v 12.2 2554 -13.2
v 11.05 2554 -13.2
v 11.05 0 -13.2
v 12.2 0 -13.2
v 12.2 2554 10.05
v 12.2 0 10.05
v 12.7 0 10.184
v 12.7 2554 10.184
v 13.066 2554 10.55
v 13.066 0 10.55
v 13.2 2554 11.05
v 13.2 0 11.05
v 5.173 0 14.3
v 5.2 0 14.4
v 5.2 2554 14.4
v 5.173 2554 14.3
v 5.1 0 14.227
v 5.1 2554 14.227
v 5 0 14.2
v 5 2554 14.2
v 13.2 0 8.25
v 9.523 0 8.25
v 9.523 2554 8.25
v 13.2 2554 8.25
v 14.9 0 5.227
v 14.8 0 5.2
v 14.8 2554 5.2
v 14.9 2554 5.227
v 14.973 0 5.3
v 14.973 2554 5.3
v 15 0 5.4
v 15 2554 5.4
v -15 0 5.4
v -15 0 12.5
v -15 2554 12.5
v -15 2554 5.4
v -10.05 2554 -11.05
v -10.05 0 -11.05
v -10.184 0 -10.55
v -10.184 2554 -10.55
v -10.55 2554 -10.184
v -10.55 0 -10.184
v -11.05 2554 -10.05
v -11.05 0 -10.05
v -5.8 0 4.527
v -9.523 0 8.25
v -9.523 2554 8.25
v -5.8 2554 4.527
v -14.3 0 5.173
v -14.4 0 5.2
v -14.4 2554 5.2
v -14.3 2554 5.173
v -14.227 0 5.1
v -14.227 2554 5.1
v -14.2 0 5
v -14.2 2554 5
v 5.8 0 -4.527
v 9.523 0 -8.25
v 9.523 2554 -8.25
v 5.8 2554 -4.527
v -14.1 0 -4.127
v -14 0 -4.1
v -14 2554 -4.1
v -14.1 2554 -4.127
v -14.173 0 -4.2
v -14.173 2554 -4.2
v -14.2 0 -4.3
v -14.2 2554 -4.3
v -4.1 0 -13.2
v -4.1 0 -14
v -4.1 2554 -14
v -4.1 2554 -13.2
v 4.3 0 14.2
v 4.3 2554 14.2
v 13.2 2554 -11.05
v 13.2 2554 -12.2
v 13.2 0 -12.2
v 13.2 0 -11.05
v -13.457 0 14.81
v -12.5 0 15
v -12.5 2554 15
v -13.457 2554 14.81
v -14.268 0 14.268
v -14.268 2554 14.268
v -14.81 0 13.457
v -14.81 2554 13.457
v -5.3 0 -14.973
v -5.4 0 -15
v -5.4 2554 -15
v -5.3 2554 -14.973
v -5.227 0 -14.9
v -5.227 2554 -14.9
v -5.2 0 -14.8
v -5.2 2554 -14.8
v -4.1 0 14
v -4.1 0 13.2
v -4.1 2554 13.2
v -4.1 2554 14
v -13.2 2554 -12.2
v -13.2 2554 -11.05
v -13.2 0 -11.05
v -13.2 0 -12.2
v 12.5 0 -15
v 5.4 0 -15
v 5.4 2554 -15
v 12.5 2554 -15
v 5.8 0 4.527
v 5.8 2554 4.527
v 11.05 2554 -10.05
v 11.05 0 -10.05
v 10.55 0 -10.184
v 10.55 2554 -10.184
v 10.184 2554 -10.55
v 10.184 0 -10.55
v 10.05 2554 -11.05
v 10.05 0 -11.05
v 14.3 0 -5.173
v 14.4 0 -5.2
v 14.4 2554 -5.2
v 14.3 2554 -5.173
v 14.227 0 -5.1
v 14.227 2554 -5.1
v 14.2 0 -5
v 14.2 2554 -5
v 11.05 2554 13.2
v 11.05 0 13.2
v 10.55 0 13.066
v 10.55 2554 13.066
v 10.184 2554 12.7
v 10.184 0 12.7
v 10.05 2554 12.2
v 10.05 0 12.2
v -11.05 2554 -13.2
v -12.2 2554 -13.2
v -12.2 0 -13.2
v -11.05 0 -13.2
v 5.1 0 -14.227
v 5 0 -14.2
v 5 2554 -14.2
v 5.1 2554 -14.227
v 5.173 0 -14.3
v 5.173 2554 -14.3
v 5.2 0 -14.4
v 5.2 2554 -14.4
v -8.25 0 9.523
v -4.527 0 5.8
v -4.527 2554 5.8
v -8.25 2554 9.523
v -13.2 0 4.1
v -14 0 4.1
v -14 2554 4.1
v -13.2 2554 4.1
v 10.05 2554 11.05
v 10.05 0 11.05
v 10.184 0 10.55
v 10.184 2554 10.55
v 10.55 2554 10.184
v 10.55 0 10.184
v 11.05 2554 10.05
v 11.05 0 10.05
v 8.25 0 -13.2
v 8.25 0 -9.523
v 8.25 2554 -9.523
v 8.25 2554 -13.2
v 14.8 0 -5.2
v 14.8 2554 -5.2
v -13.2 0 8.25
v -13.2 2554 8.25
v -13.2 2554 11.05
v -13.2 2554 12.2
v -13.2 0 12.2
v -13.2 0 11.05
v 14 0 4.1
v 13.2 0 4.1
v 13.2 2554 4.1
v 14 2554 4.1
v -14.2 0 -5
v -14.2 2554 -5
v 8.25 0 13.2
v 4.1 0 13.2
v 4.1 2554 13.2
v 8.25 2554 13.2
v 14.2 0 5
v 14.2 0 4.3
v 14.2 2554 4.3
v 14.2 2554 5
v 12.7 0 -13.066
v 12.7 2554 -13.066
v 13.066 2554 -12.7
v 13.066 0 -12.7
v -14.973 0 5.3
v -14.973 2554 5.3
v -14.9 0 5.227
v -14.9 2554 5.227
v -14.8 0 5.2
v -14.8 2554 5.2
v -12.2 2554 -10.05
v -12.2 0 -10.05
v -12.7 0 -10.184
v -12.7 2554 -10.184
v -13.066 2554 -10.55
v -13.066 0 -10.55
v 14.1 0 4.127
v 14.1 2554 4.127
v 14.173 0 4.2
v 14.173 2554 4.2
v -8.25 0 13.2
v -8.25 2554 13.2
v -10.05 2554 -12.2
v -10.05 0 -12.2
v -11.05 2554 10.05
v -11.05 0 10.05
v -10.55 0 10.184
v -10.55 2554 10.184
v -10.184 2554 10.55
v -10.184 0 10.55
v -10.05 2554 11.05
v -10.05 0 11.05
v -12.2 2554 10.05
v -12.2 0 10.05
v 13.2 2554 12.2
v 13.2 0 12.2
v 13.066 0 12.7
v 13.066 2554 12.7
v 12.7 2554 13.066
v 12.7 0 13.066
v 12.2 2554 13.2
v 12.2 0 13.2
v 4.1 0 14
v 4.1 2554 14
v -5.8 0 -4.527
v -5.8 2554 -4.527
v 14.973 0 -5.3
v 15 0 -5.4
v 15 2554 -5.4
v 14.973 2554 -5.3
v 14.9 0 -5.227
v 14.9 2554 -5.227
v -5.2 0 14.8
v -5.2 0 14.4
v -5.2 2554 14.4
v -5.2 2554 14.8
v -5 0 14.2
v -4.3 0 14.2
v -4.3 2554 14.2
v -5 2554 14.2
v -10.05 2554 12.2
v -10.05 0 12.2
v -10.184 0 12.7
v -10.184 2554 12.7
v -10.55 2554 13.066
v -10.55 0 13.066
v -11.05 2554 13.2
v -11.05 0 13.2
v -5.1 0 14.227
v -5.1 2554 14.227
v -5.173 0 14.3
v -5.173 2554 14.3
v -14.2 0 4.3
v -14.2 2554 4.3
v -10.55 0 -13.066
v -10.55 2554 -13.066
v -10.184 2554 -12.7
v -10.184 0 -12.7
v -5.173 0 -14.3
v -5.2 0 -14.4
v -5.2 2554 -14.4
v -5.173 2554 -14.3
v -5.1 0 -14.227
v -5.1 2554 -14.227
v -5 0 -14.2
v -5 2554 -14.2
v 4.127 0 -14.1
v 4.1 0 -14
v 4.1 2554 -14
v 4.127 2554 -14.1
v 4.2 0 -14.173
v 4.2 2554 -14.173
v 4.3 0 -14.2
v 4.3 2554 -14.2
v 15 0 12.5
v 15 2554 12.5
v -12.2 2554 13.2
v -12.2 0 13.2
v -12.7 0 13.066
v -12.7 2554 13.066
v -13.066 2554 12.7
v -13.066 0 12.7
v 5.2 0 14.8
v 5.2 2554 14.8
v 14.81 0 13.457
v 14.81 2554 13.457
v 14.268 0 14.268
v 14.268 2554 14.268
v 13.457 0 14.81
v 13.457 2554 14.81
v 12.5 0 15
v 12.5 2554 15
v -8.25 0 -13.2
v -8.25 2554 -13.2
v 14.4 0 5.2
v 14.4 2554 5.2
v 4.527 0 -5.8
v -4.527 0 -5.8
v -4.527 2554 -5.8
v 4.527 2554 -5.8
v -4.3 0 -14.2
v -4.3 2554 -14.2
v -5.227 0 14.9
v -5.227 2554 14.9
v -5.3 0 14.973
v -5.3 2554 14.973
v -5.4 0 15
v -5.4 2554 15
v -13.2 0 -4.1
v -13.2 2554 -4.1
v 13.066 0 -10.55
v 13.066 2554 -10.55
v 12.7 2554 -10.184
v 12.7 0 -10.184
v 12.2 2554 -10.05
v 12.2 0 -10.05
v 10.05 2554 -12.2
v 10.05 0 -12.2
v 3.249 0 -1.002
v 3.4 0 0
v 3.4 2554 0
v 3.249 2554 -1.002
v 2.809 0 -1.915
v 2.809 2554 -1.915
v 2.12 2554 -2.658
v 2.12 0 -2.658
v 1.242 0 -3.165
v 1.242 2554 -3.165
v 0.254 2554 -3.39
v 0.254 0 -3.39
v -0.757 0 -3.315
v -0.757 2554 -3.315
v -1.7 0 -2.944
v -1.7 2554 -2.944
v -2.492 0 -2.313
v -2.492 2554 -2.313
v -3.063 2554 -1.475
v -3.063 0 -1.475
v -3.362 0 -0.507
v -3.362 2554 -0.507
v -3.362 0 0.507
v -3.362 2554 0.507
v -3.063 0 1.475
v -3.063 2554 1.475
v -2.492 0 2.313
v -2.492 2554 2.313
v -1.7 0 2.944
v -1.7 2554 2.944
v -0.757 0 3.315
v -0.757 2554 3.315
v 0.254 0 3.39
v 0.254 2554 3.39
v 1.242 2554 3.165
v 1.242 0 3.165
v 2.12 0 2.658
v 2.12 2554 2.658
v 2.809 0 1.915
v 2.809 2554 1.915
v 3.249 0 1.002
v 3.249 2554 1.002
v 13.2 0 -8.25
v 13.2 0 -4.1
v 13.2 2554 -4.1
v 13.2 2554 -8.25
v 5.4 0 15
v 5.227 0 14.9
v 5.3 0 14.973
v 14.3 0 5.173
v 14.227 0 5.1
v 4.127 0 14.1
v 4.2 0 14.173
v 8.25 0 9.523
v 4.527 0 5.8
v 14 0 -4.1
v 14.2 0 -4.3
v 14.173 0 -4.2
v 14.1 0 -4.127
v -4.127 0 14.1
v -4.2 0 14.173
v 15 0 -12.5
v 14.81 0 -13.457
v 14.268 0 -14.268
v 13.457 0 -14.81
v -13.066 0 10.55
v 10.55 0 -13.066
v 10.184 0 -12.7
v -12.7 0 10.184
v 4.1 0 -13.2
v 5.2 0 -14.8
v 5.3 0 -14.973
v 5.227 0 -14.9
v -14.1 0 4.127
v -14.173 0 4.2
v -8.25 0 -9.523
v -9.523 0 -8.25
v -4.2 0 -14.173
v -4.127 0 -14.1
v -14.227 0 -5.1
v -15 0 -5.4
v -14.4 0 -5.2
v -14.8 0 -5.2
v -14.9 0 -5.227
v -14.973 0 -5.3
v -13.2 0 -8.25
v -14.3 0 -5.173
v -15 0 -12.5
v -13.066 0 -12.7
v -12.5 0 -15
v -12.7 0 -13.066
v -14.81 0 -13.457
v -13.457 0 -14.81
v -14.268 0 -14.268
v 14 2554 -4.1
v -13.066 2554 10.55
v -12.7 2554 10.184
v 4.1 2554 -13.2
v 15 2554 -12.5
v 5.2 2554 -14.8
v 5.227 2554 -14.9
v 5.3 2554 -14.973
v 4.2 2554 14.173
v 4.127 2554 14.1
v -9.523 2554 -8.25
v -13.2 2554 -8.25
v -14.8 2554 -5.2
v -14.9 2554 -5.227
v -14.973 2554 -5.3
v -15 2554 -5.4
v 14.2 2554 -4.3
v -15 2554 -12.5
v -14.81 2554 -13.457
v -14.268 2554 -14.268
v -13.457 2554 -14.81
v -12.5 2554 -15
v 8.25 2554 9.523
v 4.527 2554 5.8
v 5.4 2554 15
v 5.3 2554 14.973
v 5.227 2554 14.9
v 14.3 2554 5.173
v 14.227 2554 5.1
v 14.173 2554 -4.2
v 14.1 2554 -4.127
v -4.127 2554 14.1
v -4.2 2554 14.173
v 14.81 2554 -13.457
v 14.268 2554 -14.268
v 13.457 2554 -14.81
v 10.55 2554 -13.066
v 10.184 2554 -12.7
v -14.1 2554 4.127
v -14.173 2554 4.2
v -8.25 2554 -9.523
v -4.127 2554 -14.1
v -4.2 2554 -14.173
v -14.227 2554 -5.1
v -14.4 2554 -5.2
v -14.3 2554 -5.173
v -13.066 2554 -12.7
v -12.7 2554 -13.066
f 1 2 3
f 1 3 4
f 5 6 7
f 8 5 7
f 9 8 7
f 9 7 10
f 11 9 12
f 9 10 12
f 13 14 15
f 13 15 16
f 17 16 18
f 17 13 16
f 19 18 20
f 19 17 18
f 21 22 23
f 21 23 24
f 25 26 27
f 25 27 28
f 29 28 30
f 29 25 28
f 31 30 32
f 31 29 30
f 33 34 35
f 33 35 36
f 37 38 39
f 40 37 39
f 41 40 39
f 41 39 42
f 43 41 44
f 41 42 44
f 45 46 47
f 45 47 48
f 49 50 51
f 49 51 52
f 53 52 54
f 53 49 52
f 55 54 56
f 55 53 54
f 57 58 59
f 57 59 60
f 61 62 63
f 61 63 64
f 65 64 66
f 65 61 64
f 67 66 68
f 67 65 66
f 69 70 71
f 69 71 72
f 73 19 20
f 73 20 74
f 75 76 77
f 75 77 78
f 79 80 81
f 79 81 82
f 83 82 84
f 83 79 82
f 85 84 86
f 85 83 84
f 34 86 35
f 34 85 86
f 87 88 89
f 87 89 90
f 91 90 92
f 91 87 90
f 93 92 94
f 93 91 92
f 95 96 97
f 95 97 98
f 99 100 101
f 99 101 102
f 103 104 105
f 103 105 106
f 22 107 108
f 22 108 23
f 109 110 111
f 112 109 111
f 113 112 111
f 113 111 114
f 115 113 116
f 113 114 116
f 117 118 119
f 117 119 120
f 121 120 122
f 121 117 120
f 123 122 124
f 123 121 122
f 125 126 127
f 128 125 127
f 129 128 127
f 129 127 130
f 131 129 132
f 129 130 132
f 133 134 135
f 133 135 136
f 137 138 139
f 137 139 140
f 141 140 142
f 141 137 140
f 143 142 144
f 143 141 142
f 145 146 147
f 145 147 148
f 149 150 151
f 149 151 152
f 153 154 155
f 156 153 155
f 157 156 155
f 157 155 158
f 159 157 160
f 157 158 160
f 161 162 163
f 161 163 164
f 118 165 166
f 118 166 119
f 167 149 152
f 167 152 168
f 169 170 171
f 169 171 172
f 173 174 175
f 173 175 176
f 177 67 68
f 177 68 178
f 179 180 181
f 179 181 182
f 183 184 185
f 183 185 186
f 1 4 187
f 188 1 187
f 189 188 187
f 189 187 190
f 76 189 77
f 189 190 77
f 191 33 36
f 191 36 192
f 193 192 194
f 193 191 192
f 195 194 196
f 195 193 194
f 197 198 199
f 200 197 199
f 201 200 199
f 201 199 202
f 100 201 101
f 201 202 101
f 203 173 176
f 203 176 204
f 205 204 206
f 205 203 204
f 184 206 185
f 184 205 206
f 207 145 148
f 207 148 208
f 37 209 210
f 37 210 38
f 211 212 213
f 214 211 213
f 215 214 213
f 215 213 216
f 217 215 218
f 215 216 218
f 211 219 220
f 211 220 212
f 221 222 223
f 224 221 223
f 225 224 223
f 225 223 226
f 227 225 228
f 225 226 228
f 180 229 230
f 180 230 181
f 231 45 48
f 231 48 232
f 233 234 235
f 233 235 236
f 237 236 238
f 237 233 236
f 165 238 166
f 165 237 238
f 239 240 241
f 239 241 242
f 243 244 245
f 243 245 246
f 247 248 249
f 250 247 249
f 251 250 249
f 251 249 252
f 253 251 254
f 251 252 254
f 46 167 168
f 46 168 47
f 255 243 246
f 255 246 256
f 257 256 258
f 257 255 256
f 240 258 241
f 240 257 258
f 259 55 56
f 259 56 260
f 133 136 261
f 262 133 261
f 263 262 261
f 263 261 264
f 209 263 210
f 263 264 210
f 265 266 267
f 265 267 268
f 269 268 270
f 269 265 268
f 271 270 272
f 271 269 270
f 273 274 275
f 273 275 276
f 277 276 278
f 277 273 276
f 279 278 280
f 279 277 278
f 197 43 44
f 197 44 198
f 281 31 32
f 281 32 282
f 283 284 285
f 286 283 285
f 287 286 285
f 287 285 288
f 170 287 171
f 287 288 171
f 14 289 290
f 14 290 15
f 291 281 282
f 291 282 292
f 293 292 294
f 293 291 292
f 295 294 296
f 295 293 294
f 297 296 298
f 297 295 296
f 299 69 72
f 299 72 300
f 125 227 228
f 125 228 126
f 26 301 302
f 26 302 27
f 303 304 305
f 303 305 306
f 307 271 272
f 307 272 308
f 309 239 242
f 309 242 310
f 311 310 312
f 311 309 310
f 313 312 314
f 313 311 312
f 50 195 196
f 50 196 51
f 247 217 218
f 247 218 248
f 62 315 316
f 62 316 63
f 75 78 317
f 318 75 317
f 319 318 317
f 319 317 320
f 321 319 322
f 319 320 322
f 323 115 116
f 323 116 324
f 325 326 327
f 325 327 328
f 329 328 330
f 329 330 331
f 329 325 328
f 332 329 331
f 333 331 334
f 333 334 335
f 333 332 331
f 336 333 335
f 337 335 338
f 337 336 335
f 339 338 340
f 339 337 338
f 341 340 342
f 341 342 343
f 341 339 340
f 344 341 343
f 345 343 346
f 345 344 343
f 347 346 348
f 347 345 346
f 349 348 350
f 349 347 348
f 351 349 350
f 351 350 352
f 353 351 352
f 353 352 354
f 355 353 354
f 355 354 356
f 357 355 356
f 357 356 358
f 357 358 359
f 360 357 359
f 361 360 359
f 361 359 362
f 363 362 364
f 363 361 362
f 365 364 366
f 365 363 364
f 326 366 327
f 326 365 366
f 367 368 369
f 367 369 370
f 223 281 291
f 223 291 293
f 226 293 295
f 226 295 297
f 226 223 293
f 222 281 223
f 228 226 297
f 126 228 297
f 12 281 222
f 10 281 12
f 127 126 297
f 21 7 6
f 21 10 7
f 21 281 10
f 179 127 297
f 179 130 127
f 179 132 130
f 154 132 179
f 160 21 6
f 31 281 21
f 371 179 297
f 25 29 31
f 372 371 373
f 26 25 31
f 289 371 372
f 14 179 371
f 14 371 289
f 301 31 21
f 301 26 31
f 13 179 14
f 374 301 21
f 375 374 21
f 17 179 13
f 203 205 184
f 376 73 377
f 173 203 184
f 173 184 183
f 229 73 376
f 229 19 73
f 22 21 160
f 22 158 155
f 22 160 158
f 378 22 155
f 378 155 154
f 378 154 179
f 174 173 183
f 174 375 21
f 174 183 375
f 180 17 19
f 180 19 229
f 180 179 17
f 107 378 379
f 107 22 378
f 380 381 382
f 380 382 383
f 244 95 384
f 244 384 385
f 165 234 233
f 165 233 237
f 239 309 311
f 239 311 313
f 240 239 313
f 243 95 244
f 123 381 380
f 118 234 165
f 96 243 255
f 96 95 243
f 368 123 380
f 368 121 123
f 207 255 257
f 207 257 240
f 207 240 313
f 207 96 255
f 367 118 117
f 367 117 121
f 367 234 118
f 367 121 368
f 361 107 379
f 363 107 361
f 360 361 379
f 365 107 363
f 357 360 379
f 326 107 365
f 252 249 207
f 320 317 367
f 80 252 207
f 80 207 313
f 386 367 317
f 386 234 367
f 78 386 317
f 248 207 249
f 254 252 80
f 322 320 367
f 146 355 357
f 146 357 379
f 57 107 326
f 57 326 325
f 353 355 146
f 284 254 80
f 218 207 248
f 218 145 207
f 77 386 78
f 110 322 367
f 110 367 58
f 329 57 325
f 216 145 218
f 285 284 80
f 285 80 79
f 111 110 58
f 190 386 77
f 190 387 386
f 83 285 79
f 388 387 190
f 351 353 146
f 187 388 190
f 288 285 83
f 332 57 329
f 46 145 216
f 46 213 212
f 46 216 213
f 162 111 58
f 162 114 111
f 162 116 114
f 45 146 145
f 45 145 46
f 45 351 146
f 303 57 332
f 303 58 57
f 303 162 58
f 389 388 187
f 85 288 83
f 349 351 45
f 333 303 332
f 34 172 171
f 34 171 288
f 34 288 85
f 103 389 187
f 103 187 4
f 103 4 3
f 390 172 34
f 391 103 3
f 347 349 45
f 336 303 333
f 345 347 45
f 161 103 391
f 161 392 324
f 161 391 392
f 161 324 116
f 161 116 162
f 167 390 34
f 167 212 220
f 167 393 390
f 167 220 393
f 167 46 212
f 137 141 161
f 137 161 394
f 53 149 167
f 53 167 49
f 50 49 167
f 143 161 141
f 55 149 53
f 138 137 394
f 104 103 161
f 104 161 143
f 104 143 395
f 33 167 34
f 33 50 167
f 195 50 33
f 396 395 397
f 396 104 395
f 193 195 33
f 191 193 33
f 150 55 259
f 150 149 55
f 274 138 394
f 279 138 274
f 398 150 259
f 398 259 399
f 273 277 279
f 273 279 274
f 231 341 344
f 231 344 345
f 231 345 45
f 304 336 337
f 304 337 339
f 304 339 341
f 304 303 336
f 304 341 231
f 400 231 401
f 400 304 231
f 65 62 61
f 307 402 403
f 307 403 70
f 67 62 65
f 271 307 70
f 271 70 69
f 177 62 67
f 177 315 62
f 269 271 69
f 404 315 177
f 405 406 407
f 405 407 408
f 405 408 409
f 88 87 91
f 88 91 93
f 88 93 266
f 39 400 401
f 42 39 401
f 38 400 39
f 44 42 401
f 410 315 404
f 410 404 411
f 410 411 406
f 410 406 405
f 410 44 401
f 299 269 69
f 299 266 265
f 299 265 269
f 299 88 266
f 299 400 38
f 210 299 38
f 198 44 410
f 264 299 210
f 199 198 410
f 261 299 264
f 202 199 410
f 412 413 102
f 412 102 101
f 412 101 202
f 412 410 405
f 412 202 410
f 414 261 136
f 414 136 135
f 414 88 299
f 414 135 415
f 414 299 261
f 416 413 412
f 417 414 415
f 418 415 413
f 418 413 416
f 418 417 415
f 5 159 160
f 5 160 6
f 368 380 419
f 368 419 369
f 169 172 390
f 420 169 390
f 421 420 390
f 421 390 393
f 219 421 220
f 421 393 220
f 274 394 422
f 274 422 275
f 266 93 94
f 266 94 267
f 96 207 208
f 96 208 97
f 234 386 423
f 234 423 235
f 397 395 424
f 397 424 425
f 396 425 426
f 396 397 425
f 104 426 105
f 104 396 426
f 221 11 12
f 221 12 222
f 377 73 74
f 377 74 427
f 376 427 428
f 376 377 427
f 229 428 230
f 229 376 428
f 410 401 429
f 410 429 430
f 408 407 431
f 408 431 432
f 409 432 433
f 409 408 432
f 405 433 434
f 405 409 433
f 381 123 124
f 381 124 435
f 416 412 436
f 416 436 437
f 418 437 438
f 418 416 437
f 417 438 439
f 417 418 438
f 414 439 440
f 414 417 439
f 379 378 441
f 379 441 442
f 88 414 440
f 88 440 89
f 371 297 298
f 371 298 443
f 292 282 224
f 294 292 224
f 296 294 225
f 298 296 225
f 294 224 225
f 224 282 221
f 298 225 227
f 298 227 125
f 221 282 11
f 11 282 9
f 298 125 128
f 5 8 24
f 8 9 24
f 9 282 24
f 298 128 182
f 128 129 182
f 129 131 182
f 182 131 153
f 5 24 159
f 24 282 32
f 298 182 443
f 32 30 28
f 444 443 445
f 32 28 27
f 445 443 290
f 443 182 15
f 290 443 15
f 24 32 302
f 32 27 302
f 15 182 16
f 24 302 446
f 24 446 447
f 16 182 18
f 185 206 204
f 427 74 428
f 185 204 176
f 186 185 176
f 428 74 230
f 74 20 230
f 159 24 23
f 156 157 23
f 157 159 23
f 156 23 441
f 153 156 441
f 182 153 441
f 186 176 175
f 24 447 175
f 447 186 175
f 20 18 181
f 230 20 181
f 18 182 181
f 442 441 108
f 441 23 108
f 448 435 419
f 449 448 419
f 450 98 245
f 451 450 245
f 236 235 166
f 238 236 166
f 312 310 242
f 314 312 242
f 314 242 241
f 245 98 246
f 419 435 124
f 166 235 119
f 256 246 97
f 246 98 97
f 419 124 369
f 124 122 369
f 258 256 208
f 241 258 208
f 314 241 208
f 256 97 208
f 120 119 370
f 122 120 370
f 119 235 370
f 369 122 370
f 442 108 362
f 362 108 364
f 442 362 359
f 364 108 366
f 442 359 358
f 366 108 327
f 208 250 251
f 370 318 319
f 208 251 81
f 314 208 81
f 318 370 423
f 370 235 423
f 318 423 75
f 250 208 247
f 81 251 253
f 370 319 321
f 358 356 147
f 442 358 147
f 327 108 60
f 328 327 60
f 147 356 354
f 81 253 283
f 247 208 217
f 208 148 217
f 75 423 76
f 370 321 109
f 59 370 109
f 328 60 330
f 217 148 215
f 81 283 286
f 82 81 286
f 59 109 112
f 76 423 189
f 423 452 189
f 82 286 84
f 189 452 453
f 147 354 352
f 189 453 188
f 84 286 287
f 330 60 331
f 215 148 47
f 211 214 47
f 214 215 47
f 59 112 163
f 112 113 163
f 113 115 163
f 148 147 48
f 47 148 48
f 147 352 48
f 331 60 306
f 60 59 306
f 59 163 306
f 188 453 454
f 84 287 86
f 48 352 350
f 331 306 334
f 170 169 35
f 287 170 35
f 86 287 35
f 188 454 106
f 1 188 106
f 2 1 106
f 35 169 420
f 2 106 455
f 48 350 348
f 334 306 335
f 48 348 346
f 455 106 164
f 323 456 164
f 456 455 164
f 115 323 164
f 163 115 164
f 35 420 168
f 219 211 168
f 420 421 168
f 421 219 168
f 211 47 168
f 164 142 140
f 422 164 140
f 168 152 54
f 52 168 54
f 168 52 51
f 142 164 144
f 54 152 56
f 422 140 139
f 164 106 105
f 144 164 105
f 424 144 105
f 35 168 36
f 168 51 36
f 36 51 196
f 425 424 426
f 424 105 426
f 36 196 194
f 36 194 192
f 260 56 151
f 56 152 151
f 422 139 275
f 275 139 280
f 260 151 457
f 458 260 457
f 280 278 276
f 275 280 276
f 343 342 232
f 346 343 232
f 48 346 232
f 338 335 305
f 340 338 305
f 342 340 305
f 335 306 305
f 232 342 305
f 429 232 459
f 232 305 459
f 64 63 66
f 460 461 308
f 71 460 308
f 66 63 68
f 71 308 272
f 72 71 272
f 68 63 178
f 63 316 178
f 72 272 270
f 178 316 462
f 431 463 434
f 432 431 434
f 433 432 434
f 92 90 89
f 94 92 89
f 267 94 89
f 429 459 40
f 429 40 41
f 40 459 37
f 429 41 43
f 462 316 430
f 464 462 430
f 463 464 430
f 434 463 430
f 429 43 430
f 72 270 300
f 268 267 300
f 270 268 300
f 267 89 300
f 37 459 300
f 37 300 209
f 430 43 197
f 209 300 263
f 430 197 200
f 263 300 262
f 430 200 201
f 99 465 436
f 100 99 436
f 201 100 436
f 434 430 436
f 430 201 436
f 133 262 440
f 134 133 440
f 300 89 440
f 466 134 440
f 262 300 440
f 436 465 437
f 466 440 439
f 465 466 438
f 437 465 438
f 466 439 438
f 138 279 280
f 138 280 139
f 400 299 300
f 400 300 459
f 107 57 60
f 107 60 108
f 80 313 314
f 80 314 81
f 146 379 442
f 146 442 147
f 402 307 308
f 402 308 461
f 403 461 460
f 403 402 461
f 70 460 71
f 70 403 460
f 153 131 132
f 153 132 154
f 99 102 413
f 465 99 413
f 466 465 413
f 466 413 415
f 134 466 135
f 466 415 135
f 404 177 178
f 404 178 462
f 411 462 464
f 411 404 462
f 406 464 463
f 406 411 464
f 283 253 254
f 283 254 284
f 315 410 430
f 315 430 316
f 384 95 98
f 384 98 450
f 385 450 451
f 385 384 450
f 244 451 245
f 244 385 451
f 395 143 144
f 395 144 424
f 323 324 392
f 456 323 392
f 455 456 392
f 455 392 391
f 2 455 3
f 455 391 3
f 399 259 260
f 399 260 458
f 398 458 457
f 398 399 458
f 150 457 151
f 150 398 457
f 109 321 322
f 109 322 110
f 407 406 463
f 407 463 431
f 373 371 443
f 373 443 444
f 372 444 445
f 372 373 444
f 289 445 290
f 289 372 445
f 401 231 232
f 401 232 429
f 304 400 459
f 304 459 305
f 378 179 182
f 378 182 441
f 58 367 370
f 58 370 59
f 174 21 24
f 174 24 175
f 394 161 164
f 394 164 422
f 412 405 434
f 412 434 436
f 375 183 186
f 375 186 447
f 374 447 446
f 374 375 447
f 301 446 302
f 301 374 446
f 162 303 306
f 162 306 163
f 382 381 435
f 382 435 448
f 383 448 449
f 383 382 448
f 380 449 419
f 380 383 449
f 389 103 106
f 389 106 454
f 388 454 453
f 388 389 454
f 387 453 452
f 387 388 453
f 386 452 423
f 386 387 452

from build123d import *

# Parameters (mm, degrees)
SKETCH_3_R      = 3.4
EXTRUDE_1_DEPTH = 2554


with BuildPart() as part:
    # 草图3 → 凸台-拉伸1 (new body)
    with BuildSketch(Plane(origin=(0, 0, 0), x_dir=(1, 0, 0), z_dir=(0, 1, 0))):
        with BuildLine():
            Line((-15, -12.5), (-15, -5.4))
            ThreePointArc((-15, -5.4), (-14.941421356, -5.258578644), (-14.8, -5.2))
            Line((-14.8, -5.2), (-14.4, -5.2))
            ThreePointArc((-14.4, -5.2), (-14.258578644, -5.141421356), (-14.2, -5))
            Line((-14.2, -5), (-14.2, -4.3))
            ThreePointArc((-14.2, -4.3), (-14.141421356, -4.158578644), (-14, -4.1))
            Line((-14, -4.1), (-13.2, -4.1))
            Line((-13.2, -4.1), (-13.2, -8.25))
            Line((-13.2, -8.25), (-9.522792206, -8.25))
            Line((-9.522792206, -8.25), (-5.8, -4.527207794))
            Line((-5.8, -4.527207794), (-5.8, 4.527207794))
            Line((-5.8, 4.527207794), (-9.522792206, 8.25))
            Line((-9.522792206, 8.25), (-13.2, 8.25))
            Line((-13.2, 8.25), (-13.2, 4.1))
            Line((-13.2, 4.1), (-14, 4.1))
            ThreePointArc((-14, 4.1), (-14.141421356, 4.158578644), (-14.2, 4.3))
            Line((-14.2, 4.3), (-14.2, 5))
            ThreePointArc((-14.2, 5), (-14.258578644, 5.141421356), (-14.4, 5.2))
            Line((-14.4, 5.2), (-14.8, 5.2))
            ThreePointArc((-14.8, 5.2), (-14.941421356, 5.258578644), (-15, 5.4))
            Line((-15, 5.4), (-15, 12.5))
            ThreePointArc((-15, 12.5), (-14.267766953, 14.267766953), (-12.5, 15))
            Line((-12.5, 15), (-5.4, 15))
            ThreePointArc((-5.4, 15), (-5.258578644, 14.941421356), (-5.2, 14.8))
            Line((-5.2, 14.8), (-5.2, 14.4))
            ThreePointArc((-5.2, 14.4), (-5.141421356, 14.258578644), (-5, 14.2))
            Line((-5, 14.2), (-4.3, 14.2))
            ThreePointArc((-4.3, 14.2), (-4.158578644, 14.141421356), (-4.1, 14))
            Line((-4.1, 14), (-4.1, 13.2))
            Line((-4.1, 13.2), (-8.25, 13.2))
            Line((-8.25, 13.2), (-8.25, 9.522792206))
            Line((-8.25, 9.522792206), (-4.527207794, 5.8))
            Line((-4.527207794, 5.8), (4.527207794, 5.8))
            Line((4.527207794, 5.8), (8.25, 9.522792206))
            Line((8.25, 9.522792206), (8.25, 13.2))
            Line((8.25, 13.2), (4.1, 13.2))
            Line((4.1, 13.2), (4.1, 14))
            ThreePointArc((4.1, 14), (4.158578644, 14.141421356), (4.3, 14.2))
            Line((4.3, 14.2), (5, 14.2))
            ThreePointArc((5, 14.2), (5.141421356, 14.258578644), (5.2, 14.4))
            Line((5.2, 14.4), (5.2, 14.8))
            ThreePointArc((5.2, 14.8), (5.258578644, 14.941421356), (5.4, 15))
            Line((5.4, 15), (12.5, 15))
            ThreePointArc((12.5, 15), (14.267766953, 14.267766953), (15, 12.5))
            Line((15, 12.5), (15, 5.4))
            ThreePointArc((15, 5.4), (14.941421356, 5.258578644), (14.8, 5.2))
            Line((14.8, 5.2), (14.4, 5.2))
            ThreePointArc((14.4, 5.2), (14.258578644, 5.141421356), (14.2, 5))
            Line((14.2, 5), (14.2, 4.3))
            ThreePointArc((14.2, 4.3), (14.141421356, 4.158578644), (14, 4.1))
            Line((14, 4.1), (13.2, 4.1))
            Line((13.2, 4.1), (13.2, 8.25))
            Line((13.2, 8.25), (9.522792206, 8.25))
            Line((9.522792206, 8.25), (5.8, 4.527207794))
            Line((5.8, 4.527207794), (5.8, -4.527207794))
            Line((5.8, -4.527207794), (9.522792206, -8.25))
            Line((9.522792206, -8.25), (13.2, -8.25))
            Line((13.2, -8.25), (13.2, -4.1))
            Line((13.2, -4.1), (14, -4.1))
            ThreePointArc((14, -4.1), (14.141421356, -4.158578644), (14.2, -4.3))
            Line((14.2, -4.3), (14.2, -5))
            ThreePointArc((14.2, -5), (14.258578644, -5.141421356), (14.4, -5.2))
            Line((14.4, -5.2), (14.8, -5.2))
            ThreePointArc((14.8, -5.2), (14.941421356, -5.258578644), (15, -5.4))
            Line((15, -5.4), (15, -12.5))
            ThreePointArc((15, -12.5), (14.267766953, -14.267766953), (12.5, -15))
            Line((12.5, -15), (5.4, -15))
            ThreePointArc((5.4, -15), (5.258578644, -14.941421356), (5.2, -14.8))
            Line((5.2, -14.8), (5.2, -14.4))
            ThreePointArc((5.2, -14.4), (5.141421356, -14.258578644), (5, -14.2))
            Line((5, -14.2), (4.3, -14.2))
            ThreePointArc((4.3, -14.2), (4.158578644, -14.141421356), (4.1, -14))
            Line((4.1, -14), (4.1, -13.2))
            Line((4.1, -13.2), (8.25, -13.2))
            Line((8.25, -13.2), (8.25, -9.522792206))
            Line((8.25, -9.522792206), (4.527207794, -5.8))
            Line((4.527207794, -5.8), (-4.527207794, -5.8))
            Line((-4.527207794, -5.8), (-8.25, -9.522792206))
            Line((-8.25, -9.522792206), (-8.25, -13.2))
            Line((-8.25, -13.2), (-4.1, -13.2))
            Line((-4.1, -13.2), (-4.1, -14))
            ThreePointArc((-4.1, -14), (-4.158578644, -14.141421356), (-4.3, -14.2))
            Line((-4.3, -14.2), (-5, -14.2))
            ThreePointArc((-5, -14.2), (-5.141421356, -14.258578644), (-5.2, -14.4))
            Line((-5.2, -14.4), (-5.2, -14.8))
            ThreePointArc((-5.2, -14.8), (-5.258578644, -14.941421356), (-5.4, -15))
            Line((-5.4, -15), (-12.5, -15))
            ThreePointArc((-12.5, -15), (-14.267766953, -14.267766953), (-15, -12.5))
        make_face()
        Circle(SKETCH_3_R, mode=Mode.SUBTRACT)
        with BuildLine():
            Line((-13.2, -12.2), (-13.2, -11.05))
            ThreePointArc((-13.2, -11.05), (-12.907106781, -10.342893219), (-12.2, -10.05))
            Line((-12.2, -10.05), (-11.05, -10.05))
            ThreePointArc((-11.05, -10.05), (-10.342893219, -10.342893219), (-10.05, -11.05))
            Line((-10.05, -11.05), (-10.05, -12.2))
            ThreePointArc((-10.05, -12.2), (-10.342893219, -12.907106781), (-11.05, -13.2))
            Line((-11.05, -13.2), (-12.2, -13.2))
            ThreePointArc((-12.2, -13.2), (-12.907106781, -12.907106781), (-13.2, -12.2))
        make_face(mode=Mode.SUBTRACT)
        with BuildLine():
            Line((-10.05, 12.2), (-10.05, 11.05))
            ThreePointArc((-10.05, 11.05), (-10.342893219, 10.342893219), (-11.05, 10.05))
            Line((-11.05, 10.05), (-12.2, 10.05))
            ThreePointArc((-12.2, 10.05), (-12.907106781, 10.342893219), (-13.2, 11.05))
            Line((-13.2, 11.05), (-13.2, 12.2))
            ThreePointArc((-13.2, 12.2), (-12.907106781, 12.907106781), (-12.2, 13.2))
            Line((-12.2, 13.2), (-11.05, 13.2))
            ThreePointArc((-11.05, 13.2), (-10.342893219, 12.907106781), (-10.05, 12.2))
        make_face(mode=Mode.SUBTRACT)
        with BuildLine():
            Line((13.2, 12.2), (13.2, 11.05))
            ThreePointArc((13.2, 11.05), (12.907106781, 10.342893219), (12.2, 10.05))
            Line((12.2, 10.05), (11.05, 10.05))
            ThreePointArc((11.05, 10.05), (10.342893219, 10.342893219), (10.05, 11.05))
            Line((10.05, 11.05), (10.05, 12.2))
            ThreePointArc((10.05, 12.2), (10.342893219, 12.907106781), (11.05, 13.2))
            Line((11.05, 13.2), (12.2, 13.2))
            ThreePointArc((12.2, 13.2), (12.907106781, 12.907106781), (13.2, 12.2))
        make_face(mode=Mode.SUBTRACT)
        with BuildLine():
            Line((10.05, -12.2), (10.05, -11.05))
            ThreePointArc((10.05, -11.05), (10.342893219, -10.342893219), (11.05, -10.05))
            Line((11.05, -10.05), (12.2, -10.05))
            ThreePointArc((12.2, -10.05), (12.907106781, -10.342893219), (13.2, -11.05))
            Line((13.2, -11.05), (13.2, -12.2))
            ThreePointArc((13.2, -12.2), (12.907106781, -12.907106781), (12.2, -13.2))
            Line((12.2, -13.2), (11.05, -13.2))
            ThreePointArc((11.05, -13.2), (10.342893219, -12.907106781), (10.05, -12.2))
        make_face(mode=Mode.SUBTRACT)
    extrude(amount=EXTRUDE_1_DEPTH)


solid = part.part
